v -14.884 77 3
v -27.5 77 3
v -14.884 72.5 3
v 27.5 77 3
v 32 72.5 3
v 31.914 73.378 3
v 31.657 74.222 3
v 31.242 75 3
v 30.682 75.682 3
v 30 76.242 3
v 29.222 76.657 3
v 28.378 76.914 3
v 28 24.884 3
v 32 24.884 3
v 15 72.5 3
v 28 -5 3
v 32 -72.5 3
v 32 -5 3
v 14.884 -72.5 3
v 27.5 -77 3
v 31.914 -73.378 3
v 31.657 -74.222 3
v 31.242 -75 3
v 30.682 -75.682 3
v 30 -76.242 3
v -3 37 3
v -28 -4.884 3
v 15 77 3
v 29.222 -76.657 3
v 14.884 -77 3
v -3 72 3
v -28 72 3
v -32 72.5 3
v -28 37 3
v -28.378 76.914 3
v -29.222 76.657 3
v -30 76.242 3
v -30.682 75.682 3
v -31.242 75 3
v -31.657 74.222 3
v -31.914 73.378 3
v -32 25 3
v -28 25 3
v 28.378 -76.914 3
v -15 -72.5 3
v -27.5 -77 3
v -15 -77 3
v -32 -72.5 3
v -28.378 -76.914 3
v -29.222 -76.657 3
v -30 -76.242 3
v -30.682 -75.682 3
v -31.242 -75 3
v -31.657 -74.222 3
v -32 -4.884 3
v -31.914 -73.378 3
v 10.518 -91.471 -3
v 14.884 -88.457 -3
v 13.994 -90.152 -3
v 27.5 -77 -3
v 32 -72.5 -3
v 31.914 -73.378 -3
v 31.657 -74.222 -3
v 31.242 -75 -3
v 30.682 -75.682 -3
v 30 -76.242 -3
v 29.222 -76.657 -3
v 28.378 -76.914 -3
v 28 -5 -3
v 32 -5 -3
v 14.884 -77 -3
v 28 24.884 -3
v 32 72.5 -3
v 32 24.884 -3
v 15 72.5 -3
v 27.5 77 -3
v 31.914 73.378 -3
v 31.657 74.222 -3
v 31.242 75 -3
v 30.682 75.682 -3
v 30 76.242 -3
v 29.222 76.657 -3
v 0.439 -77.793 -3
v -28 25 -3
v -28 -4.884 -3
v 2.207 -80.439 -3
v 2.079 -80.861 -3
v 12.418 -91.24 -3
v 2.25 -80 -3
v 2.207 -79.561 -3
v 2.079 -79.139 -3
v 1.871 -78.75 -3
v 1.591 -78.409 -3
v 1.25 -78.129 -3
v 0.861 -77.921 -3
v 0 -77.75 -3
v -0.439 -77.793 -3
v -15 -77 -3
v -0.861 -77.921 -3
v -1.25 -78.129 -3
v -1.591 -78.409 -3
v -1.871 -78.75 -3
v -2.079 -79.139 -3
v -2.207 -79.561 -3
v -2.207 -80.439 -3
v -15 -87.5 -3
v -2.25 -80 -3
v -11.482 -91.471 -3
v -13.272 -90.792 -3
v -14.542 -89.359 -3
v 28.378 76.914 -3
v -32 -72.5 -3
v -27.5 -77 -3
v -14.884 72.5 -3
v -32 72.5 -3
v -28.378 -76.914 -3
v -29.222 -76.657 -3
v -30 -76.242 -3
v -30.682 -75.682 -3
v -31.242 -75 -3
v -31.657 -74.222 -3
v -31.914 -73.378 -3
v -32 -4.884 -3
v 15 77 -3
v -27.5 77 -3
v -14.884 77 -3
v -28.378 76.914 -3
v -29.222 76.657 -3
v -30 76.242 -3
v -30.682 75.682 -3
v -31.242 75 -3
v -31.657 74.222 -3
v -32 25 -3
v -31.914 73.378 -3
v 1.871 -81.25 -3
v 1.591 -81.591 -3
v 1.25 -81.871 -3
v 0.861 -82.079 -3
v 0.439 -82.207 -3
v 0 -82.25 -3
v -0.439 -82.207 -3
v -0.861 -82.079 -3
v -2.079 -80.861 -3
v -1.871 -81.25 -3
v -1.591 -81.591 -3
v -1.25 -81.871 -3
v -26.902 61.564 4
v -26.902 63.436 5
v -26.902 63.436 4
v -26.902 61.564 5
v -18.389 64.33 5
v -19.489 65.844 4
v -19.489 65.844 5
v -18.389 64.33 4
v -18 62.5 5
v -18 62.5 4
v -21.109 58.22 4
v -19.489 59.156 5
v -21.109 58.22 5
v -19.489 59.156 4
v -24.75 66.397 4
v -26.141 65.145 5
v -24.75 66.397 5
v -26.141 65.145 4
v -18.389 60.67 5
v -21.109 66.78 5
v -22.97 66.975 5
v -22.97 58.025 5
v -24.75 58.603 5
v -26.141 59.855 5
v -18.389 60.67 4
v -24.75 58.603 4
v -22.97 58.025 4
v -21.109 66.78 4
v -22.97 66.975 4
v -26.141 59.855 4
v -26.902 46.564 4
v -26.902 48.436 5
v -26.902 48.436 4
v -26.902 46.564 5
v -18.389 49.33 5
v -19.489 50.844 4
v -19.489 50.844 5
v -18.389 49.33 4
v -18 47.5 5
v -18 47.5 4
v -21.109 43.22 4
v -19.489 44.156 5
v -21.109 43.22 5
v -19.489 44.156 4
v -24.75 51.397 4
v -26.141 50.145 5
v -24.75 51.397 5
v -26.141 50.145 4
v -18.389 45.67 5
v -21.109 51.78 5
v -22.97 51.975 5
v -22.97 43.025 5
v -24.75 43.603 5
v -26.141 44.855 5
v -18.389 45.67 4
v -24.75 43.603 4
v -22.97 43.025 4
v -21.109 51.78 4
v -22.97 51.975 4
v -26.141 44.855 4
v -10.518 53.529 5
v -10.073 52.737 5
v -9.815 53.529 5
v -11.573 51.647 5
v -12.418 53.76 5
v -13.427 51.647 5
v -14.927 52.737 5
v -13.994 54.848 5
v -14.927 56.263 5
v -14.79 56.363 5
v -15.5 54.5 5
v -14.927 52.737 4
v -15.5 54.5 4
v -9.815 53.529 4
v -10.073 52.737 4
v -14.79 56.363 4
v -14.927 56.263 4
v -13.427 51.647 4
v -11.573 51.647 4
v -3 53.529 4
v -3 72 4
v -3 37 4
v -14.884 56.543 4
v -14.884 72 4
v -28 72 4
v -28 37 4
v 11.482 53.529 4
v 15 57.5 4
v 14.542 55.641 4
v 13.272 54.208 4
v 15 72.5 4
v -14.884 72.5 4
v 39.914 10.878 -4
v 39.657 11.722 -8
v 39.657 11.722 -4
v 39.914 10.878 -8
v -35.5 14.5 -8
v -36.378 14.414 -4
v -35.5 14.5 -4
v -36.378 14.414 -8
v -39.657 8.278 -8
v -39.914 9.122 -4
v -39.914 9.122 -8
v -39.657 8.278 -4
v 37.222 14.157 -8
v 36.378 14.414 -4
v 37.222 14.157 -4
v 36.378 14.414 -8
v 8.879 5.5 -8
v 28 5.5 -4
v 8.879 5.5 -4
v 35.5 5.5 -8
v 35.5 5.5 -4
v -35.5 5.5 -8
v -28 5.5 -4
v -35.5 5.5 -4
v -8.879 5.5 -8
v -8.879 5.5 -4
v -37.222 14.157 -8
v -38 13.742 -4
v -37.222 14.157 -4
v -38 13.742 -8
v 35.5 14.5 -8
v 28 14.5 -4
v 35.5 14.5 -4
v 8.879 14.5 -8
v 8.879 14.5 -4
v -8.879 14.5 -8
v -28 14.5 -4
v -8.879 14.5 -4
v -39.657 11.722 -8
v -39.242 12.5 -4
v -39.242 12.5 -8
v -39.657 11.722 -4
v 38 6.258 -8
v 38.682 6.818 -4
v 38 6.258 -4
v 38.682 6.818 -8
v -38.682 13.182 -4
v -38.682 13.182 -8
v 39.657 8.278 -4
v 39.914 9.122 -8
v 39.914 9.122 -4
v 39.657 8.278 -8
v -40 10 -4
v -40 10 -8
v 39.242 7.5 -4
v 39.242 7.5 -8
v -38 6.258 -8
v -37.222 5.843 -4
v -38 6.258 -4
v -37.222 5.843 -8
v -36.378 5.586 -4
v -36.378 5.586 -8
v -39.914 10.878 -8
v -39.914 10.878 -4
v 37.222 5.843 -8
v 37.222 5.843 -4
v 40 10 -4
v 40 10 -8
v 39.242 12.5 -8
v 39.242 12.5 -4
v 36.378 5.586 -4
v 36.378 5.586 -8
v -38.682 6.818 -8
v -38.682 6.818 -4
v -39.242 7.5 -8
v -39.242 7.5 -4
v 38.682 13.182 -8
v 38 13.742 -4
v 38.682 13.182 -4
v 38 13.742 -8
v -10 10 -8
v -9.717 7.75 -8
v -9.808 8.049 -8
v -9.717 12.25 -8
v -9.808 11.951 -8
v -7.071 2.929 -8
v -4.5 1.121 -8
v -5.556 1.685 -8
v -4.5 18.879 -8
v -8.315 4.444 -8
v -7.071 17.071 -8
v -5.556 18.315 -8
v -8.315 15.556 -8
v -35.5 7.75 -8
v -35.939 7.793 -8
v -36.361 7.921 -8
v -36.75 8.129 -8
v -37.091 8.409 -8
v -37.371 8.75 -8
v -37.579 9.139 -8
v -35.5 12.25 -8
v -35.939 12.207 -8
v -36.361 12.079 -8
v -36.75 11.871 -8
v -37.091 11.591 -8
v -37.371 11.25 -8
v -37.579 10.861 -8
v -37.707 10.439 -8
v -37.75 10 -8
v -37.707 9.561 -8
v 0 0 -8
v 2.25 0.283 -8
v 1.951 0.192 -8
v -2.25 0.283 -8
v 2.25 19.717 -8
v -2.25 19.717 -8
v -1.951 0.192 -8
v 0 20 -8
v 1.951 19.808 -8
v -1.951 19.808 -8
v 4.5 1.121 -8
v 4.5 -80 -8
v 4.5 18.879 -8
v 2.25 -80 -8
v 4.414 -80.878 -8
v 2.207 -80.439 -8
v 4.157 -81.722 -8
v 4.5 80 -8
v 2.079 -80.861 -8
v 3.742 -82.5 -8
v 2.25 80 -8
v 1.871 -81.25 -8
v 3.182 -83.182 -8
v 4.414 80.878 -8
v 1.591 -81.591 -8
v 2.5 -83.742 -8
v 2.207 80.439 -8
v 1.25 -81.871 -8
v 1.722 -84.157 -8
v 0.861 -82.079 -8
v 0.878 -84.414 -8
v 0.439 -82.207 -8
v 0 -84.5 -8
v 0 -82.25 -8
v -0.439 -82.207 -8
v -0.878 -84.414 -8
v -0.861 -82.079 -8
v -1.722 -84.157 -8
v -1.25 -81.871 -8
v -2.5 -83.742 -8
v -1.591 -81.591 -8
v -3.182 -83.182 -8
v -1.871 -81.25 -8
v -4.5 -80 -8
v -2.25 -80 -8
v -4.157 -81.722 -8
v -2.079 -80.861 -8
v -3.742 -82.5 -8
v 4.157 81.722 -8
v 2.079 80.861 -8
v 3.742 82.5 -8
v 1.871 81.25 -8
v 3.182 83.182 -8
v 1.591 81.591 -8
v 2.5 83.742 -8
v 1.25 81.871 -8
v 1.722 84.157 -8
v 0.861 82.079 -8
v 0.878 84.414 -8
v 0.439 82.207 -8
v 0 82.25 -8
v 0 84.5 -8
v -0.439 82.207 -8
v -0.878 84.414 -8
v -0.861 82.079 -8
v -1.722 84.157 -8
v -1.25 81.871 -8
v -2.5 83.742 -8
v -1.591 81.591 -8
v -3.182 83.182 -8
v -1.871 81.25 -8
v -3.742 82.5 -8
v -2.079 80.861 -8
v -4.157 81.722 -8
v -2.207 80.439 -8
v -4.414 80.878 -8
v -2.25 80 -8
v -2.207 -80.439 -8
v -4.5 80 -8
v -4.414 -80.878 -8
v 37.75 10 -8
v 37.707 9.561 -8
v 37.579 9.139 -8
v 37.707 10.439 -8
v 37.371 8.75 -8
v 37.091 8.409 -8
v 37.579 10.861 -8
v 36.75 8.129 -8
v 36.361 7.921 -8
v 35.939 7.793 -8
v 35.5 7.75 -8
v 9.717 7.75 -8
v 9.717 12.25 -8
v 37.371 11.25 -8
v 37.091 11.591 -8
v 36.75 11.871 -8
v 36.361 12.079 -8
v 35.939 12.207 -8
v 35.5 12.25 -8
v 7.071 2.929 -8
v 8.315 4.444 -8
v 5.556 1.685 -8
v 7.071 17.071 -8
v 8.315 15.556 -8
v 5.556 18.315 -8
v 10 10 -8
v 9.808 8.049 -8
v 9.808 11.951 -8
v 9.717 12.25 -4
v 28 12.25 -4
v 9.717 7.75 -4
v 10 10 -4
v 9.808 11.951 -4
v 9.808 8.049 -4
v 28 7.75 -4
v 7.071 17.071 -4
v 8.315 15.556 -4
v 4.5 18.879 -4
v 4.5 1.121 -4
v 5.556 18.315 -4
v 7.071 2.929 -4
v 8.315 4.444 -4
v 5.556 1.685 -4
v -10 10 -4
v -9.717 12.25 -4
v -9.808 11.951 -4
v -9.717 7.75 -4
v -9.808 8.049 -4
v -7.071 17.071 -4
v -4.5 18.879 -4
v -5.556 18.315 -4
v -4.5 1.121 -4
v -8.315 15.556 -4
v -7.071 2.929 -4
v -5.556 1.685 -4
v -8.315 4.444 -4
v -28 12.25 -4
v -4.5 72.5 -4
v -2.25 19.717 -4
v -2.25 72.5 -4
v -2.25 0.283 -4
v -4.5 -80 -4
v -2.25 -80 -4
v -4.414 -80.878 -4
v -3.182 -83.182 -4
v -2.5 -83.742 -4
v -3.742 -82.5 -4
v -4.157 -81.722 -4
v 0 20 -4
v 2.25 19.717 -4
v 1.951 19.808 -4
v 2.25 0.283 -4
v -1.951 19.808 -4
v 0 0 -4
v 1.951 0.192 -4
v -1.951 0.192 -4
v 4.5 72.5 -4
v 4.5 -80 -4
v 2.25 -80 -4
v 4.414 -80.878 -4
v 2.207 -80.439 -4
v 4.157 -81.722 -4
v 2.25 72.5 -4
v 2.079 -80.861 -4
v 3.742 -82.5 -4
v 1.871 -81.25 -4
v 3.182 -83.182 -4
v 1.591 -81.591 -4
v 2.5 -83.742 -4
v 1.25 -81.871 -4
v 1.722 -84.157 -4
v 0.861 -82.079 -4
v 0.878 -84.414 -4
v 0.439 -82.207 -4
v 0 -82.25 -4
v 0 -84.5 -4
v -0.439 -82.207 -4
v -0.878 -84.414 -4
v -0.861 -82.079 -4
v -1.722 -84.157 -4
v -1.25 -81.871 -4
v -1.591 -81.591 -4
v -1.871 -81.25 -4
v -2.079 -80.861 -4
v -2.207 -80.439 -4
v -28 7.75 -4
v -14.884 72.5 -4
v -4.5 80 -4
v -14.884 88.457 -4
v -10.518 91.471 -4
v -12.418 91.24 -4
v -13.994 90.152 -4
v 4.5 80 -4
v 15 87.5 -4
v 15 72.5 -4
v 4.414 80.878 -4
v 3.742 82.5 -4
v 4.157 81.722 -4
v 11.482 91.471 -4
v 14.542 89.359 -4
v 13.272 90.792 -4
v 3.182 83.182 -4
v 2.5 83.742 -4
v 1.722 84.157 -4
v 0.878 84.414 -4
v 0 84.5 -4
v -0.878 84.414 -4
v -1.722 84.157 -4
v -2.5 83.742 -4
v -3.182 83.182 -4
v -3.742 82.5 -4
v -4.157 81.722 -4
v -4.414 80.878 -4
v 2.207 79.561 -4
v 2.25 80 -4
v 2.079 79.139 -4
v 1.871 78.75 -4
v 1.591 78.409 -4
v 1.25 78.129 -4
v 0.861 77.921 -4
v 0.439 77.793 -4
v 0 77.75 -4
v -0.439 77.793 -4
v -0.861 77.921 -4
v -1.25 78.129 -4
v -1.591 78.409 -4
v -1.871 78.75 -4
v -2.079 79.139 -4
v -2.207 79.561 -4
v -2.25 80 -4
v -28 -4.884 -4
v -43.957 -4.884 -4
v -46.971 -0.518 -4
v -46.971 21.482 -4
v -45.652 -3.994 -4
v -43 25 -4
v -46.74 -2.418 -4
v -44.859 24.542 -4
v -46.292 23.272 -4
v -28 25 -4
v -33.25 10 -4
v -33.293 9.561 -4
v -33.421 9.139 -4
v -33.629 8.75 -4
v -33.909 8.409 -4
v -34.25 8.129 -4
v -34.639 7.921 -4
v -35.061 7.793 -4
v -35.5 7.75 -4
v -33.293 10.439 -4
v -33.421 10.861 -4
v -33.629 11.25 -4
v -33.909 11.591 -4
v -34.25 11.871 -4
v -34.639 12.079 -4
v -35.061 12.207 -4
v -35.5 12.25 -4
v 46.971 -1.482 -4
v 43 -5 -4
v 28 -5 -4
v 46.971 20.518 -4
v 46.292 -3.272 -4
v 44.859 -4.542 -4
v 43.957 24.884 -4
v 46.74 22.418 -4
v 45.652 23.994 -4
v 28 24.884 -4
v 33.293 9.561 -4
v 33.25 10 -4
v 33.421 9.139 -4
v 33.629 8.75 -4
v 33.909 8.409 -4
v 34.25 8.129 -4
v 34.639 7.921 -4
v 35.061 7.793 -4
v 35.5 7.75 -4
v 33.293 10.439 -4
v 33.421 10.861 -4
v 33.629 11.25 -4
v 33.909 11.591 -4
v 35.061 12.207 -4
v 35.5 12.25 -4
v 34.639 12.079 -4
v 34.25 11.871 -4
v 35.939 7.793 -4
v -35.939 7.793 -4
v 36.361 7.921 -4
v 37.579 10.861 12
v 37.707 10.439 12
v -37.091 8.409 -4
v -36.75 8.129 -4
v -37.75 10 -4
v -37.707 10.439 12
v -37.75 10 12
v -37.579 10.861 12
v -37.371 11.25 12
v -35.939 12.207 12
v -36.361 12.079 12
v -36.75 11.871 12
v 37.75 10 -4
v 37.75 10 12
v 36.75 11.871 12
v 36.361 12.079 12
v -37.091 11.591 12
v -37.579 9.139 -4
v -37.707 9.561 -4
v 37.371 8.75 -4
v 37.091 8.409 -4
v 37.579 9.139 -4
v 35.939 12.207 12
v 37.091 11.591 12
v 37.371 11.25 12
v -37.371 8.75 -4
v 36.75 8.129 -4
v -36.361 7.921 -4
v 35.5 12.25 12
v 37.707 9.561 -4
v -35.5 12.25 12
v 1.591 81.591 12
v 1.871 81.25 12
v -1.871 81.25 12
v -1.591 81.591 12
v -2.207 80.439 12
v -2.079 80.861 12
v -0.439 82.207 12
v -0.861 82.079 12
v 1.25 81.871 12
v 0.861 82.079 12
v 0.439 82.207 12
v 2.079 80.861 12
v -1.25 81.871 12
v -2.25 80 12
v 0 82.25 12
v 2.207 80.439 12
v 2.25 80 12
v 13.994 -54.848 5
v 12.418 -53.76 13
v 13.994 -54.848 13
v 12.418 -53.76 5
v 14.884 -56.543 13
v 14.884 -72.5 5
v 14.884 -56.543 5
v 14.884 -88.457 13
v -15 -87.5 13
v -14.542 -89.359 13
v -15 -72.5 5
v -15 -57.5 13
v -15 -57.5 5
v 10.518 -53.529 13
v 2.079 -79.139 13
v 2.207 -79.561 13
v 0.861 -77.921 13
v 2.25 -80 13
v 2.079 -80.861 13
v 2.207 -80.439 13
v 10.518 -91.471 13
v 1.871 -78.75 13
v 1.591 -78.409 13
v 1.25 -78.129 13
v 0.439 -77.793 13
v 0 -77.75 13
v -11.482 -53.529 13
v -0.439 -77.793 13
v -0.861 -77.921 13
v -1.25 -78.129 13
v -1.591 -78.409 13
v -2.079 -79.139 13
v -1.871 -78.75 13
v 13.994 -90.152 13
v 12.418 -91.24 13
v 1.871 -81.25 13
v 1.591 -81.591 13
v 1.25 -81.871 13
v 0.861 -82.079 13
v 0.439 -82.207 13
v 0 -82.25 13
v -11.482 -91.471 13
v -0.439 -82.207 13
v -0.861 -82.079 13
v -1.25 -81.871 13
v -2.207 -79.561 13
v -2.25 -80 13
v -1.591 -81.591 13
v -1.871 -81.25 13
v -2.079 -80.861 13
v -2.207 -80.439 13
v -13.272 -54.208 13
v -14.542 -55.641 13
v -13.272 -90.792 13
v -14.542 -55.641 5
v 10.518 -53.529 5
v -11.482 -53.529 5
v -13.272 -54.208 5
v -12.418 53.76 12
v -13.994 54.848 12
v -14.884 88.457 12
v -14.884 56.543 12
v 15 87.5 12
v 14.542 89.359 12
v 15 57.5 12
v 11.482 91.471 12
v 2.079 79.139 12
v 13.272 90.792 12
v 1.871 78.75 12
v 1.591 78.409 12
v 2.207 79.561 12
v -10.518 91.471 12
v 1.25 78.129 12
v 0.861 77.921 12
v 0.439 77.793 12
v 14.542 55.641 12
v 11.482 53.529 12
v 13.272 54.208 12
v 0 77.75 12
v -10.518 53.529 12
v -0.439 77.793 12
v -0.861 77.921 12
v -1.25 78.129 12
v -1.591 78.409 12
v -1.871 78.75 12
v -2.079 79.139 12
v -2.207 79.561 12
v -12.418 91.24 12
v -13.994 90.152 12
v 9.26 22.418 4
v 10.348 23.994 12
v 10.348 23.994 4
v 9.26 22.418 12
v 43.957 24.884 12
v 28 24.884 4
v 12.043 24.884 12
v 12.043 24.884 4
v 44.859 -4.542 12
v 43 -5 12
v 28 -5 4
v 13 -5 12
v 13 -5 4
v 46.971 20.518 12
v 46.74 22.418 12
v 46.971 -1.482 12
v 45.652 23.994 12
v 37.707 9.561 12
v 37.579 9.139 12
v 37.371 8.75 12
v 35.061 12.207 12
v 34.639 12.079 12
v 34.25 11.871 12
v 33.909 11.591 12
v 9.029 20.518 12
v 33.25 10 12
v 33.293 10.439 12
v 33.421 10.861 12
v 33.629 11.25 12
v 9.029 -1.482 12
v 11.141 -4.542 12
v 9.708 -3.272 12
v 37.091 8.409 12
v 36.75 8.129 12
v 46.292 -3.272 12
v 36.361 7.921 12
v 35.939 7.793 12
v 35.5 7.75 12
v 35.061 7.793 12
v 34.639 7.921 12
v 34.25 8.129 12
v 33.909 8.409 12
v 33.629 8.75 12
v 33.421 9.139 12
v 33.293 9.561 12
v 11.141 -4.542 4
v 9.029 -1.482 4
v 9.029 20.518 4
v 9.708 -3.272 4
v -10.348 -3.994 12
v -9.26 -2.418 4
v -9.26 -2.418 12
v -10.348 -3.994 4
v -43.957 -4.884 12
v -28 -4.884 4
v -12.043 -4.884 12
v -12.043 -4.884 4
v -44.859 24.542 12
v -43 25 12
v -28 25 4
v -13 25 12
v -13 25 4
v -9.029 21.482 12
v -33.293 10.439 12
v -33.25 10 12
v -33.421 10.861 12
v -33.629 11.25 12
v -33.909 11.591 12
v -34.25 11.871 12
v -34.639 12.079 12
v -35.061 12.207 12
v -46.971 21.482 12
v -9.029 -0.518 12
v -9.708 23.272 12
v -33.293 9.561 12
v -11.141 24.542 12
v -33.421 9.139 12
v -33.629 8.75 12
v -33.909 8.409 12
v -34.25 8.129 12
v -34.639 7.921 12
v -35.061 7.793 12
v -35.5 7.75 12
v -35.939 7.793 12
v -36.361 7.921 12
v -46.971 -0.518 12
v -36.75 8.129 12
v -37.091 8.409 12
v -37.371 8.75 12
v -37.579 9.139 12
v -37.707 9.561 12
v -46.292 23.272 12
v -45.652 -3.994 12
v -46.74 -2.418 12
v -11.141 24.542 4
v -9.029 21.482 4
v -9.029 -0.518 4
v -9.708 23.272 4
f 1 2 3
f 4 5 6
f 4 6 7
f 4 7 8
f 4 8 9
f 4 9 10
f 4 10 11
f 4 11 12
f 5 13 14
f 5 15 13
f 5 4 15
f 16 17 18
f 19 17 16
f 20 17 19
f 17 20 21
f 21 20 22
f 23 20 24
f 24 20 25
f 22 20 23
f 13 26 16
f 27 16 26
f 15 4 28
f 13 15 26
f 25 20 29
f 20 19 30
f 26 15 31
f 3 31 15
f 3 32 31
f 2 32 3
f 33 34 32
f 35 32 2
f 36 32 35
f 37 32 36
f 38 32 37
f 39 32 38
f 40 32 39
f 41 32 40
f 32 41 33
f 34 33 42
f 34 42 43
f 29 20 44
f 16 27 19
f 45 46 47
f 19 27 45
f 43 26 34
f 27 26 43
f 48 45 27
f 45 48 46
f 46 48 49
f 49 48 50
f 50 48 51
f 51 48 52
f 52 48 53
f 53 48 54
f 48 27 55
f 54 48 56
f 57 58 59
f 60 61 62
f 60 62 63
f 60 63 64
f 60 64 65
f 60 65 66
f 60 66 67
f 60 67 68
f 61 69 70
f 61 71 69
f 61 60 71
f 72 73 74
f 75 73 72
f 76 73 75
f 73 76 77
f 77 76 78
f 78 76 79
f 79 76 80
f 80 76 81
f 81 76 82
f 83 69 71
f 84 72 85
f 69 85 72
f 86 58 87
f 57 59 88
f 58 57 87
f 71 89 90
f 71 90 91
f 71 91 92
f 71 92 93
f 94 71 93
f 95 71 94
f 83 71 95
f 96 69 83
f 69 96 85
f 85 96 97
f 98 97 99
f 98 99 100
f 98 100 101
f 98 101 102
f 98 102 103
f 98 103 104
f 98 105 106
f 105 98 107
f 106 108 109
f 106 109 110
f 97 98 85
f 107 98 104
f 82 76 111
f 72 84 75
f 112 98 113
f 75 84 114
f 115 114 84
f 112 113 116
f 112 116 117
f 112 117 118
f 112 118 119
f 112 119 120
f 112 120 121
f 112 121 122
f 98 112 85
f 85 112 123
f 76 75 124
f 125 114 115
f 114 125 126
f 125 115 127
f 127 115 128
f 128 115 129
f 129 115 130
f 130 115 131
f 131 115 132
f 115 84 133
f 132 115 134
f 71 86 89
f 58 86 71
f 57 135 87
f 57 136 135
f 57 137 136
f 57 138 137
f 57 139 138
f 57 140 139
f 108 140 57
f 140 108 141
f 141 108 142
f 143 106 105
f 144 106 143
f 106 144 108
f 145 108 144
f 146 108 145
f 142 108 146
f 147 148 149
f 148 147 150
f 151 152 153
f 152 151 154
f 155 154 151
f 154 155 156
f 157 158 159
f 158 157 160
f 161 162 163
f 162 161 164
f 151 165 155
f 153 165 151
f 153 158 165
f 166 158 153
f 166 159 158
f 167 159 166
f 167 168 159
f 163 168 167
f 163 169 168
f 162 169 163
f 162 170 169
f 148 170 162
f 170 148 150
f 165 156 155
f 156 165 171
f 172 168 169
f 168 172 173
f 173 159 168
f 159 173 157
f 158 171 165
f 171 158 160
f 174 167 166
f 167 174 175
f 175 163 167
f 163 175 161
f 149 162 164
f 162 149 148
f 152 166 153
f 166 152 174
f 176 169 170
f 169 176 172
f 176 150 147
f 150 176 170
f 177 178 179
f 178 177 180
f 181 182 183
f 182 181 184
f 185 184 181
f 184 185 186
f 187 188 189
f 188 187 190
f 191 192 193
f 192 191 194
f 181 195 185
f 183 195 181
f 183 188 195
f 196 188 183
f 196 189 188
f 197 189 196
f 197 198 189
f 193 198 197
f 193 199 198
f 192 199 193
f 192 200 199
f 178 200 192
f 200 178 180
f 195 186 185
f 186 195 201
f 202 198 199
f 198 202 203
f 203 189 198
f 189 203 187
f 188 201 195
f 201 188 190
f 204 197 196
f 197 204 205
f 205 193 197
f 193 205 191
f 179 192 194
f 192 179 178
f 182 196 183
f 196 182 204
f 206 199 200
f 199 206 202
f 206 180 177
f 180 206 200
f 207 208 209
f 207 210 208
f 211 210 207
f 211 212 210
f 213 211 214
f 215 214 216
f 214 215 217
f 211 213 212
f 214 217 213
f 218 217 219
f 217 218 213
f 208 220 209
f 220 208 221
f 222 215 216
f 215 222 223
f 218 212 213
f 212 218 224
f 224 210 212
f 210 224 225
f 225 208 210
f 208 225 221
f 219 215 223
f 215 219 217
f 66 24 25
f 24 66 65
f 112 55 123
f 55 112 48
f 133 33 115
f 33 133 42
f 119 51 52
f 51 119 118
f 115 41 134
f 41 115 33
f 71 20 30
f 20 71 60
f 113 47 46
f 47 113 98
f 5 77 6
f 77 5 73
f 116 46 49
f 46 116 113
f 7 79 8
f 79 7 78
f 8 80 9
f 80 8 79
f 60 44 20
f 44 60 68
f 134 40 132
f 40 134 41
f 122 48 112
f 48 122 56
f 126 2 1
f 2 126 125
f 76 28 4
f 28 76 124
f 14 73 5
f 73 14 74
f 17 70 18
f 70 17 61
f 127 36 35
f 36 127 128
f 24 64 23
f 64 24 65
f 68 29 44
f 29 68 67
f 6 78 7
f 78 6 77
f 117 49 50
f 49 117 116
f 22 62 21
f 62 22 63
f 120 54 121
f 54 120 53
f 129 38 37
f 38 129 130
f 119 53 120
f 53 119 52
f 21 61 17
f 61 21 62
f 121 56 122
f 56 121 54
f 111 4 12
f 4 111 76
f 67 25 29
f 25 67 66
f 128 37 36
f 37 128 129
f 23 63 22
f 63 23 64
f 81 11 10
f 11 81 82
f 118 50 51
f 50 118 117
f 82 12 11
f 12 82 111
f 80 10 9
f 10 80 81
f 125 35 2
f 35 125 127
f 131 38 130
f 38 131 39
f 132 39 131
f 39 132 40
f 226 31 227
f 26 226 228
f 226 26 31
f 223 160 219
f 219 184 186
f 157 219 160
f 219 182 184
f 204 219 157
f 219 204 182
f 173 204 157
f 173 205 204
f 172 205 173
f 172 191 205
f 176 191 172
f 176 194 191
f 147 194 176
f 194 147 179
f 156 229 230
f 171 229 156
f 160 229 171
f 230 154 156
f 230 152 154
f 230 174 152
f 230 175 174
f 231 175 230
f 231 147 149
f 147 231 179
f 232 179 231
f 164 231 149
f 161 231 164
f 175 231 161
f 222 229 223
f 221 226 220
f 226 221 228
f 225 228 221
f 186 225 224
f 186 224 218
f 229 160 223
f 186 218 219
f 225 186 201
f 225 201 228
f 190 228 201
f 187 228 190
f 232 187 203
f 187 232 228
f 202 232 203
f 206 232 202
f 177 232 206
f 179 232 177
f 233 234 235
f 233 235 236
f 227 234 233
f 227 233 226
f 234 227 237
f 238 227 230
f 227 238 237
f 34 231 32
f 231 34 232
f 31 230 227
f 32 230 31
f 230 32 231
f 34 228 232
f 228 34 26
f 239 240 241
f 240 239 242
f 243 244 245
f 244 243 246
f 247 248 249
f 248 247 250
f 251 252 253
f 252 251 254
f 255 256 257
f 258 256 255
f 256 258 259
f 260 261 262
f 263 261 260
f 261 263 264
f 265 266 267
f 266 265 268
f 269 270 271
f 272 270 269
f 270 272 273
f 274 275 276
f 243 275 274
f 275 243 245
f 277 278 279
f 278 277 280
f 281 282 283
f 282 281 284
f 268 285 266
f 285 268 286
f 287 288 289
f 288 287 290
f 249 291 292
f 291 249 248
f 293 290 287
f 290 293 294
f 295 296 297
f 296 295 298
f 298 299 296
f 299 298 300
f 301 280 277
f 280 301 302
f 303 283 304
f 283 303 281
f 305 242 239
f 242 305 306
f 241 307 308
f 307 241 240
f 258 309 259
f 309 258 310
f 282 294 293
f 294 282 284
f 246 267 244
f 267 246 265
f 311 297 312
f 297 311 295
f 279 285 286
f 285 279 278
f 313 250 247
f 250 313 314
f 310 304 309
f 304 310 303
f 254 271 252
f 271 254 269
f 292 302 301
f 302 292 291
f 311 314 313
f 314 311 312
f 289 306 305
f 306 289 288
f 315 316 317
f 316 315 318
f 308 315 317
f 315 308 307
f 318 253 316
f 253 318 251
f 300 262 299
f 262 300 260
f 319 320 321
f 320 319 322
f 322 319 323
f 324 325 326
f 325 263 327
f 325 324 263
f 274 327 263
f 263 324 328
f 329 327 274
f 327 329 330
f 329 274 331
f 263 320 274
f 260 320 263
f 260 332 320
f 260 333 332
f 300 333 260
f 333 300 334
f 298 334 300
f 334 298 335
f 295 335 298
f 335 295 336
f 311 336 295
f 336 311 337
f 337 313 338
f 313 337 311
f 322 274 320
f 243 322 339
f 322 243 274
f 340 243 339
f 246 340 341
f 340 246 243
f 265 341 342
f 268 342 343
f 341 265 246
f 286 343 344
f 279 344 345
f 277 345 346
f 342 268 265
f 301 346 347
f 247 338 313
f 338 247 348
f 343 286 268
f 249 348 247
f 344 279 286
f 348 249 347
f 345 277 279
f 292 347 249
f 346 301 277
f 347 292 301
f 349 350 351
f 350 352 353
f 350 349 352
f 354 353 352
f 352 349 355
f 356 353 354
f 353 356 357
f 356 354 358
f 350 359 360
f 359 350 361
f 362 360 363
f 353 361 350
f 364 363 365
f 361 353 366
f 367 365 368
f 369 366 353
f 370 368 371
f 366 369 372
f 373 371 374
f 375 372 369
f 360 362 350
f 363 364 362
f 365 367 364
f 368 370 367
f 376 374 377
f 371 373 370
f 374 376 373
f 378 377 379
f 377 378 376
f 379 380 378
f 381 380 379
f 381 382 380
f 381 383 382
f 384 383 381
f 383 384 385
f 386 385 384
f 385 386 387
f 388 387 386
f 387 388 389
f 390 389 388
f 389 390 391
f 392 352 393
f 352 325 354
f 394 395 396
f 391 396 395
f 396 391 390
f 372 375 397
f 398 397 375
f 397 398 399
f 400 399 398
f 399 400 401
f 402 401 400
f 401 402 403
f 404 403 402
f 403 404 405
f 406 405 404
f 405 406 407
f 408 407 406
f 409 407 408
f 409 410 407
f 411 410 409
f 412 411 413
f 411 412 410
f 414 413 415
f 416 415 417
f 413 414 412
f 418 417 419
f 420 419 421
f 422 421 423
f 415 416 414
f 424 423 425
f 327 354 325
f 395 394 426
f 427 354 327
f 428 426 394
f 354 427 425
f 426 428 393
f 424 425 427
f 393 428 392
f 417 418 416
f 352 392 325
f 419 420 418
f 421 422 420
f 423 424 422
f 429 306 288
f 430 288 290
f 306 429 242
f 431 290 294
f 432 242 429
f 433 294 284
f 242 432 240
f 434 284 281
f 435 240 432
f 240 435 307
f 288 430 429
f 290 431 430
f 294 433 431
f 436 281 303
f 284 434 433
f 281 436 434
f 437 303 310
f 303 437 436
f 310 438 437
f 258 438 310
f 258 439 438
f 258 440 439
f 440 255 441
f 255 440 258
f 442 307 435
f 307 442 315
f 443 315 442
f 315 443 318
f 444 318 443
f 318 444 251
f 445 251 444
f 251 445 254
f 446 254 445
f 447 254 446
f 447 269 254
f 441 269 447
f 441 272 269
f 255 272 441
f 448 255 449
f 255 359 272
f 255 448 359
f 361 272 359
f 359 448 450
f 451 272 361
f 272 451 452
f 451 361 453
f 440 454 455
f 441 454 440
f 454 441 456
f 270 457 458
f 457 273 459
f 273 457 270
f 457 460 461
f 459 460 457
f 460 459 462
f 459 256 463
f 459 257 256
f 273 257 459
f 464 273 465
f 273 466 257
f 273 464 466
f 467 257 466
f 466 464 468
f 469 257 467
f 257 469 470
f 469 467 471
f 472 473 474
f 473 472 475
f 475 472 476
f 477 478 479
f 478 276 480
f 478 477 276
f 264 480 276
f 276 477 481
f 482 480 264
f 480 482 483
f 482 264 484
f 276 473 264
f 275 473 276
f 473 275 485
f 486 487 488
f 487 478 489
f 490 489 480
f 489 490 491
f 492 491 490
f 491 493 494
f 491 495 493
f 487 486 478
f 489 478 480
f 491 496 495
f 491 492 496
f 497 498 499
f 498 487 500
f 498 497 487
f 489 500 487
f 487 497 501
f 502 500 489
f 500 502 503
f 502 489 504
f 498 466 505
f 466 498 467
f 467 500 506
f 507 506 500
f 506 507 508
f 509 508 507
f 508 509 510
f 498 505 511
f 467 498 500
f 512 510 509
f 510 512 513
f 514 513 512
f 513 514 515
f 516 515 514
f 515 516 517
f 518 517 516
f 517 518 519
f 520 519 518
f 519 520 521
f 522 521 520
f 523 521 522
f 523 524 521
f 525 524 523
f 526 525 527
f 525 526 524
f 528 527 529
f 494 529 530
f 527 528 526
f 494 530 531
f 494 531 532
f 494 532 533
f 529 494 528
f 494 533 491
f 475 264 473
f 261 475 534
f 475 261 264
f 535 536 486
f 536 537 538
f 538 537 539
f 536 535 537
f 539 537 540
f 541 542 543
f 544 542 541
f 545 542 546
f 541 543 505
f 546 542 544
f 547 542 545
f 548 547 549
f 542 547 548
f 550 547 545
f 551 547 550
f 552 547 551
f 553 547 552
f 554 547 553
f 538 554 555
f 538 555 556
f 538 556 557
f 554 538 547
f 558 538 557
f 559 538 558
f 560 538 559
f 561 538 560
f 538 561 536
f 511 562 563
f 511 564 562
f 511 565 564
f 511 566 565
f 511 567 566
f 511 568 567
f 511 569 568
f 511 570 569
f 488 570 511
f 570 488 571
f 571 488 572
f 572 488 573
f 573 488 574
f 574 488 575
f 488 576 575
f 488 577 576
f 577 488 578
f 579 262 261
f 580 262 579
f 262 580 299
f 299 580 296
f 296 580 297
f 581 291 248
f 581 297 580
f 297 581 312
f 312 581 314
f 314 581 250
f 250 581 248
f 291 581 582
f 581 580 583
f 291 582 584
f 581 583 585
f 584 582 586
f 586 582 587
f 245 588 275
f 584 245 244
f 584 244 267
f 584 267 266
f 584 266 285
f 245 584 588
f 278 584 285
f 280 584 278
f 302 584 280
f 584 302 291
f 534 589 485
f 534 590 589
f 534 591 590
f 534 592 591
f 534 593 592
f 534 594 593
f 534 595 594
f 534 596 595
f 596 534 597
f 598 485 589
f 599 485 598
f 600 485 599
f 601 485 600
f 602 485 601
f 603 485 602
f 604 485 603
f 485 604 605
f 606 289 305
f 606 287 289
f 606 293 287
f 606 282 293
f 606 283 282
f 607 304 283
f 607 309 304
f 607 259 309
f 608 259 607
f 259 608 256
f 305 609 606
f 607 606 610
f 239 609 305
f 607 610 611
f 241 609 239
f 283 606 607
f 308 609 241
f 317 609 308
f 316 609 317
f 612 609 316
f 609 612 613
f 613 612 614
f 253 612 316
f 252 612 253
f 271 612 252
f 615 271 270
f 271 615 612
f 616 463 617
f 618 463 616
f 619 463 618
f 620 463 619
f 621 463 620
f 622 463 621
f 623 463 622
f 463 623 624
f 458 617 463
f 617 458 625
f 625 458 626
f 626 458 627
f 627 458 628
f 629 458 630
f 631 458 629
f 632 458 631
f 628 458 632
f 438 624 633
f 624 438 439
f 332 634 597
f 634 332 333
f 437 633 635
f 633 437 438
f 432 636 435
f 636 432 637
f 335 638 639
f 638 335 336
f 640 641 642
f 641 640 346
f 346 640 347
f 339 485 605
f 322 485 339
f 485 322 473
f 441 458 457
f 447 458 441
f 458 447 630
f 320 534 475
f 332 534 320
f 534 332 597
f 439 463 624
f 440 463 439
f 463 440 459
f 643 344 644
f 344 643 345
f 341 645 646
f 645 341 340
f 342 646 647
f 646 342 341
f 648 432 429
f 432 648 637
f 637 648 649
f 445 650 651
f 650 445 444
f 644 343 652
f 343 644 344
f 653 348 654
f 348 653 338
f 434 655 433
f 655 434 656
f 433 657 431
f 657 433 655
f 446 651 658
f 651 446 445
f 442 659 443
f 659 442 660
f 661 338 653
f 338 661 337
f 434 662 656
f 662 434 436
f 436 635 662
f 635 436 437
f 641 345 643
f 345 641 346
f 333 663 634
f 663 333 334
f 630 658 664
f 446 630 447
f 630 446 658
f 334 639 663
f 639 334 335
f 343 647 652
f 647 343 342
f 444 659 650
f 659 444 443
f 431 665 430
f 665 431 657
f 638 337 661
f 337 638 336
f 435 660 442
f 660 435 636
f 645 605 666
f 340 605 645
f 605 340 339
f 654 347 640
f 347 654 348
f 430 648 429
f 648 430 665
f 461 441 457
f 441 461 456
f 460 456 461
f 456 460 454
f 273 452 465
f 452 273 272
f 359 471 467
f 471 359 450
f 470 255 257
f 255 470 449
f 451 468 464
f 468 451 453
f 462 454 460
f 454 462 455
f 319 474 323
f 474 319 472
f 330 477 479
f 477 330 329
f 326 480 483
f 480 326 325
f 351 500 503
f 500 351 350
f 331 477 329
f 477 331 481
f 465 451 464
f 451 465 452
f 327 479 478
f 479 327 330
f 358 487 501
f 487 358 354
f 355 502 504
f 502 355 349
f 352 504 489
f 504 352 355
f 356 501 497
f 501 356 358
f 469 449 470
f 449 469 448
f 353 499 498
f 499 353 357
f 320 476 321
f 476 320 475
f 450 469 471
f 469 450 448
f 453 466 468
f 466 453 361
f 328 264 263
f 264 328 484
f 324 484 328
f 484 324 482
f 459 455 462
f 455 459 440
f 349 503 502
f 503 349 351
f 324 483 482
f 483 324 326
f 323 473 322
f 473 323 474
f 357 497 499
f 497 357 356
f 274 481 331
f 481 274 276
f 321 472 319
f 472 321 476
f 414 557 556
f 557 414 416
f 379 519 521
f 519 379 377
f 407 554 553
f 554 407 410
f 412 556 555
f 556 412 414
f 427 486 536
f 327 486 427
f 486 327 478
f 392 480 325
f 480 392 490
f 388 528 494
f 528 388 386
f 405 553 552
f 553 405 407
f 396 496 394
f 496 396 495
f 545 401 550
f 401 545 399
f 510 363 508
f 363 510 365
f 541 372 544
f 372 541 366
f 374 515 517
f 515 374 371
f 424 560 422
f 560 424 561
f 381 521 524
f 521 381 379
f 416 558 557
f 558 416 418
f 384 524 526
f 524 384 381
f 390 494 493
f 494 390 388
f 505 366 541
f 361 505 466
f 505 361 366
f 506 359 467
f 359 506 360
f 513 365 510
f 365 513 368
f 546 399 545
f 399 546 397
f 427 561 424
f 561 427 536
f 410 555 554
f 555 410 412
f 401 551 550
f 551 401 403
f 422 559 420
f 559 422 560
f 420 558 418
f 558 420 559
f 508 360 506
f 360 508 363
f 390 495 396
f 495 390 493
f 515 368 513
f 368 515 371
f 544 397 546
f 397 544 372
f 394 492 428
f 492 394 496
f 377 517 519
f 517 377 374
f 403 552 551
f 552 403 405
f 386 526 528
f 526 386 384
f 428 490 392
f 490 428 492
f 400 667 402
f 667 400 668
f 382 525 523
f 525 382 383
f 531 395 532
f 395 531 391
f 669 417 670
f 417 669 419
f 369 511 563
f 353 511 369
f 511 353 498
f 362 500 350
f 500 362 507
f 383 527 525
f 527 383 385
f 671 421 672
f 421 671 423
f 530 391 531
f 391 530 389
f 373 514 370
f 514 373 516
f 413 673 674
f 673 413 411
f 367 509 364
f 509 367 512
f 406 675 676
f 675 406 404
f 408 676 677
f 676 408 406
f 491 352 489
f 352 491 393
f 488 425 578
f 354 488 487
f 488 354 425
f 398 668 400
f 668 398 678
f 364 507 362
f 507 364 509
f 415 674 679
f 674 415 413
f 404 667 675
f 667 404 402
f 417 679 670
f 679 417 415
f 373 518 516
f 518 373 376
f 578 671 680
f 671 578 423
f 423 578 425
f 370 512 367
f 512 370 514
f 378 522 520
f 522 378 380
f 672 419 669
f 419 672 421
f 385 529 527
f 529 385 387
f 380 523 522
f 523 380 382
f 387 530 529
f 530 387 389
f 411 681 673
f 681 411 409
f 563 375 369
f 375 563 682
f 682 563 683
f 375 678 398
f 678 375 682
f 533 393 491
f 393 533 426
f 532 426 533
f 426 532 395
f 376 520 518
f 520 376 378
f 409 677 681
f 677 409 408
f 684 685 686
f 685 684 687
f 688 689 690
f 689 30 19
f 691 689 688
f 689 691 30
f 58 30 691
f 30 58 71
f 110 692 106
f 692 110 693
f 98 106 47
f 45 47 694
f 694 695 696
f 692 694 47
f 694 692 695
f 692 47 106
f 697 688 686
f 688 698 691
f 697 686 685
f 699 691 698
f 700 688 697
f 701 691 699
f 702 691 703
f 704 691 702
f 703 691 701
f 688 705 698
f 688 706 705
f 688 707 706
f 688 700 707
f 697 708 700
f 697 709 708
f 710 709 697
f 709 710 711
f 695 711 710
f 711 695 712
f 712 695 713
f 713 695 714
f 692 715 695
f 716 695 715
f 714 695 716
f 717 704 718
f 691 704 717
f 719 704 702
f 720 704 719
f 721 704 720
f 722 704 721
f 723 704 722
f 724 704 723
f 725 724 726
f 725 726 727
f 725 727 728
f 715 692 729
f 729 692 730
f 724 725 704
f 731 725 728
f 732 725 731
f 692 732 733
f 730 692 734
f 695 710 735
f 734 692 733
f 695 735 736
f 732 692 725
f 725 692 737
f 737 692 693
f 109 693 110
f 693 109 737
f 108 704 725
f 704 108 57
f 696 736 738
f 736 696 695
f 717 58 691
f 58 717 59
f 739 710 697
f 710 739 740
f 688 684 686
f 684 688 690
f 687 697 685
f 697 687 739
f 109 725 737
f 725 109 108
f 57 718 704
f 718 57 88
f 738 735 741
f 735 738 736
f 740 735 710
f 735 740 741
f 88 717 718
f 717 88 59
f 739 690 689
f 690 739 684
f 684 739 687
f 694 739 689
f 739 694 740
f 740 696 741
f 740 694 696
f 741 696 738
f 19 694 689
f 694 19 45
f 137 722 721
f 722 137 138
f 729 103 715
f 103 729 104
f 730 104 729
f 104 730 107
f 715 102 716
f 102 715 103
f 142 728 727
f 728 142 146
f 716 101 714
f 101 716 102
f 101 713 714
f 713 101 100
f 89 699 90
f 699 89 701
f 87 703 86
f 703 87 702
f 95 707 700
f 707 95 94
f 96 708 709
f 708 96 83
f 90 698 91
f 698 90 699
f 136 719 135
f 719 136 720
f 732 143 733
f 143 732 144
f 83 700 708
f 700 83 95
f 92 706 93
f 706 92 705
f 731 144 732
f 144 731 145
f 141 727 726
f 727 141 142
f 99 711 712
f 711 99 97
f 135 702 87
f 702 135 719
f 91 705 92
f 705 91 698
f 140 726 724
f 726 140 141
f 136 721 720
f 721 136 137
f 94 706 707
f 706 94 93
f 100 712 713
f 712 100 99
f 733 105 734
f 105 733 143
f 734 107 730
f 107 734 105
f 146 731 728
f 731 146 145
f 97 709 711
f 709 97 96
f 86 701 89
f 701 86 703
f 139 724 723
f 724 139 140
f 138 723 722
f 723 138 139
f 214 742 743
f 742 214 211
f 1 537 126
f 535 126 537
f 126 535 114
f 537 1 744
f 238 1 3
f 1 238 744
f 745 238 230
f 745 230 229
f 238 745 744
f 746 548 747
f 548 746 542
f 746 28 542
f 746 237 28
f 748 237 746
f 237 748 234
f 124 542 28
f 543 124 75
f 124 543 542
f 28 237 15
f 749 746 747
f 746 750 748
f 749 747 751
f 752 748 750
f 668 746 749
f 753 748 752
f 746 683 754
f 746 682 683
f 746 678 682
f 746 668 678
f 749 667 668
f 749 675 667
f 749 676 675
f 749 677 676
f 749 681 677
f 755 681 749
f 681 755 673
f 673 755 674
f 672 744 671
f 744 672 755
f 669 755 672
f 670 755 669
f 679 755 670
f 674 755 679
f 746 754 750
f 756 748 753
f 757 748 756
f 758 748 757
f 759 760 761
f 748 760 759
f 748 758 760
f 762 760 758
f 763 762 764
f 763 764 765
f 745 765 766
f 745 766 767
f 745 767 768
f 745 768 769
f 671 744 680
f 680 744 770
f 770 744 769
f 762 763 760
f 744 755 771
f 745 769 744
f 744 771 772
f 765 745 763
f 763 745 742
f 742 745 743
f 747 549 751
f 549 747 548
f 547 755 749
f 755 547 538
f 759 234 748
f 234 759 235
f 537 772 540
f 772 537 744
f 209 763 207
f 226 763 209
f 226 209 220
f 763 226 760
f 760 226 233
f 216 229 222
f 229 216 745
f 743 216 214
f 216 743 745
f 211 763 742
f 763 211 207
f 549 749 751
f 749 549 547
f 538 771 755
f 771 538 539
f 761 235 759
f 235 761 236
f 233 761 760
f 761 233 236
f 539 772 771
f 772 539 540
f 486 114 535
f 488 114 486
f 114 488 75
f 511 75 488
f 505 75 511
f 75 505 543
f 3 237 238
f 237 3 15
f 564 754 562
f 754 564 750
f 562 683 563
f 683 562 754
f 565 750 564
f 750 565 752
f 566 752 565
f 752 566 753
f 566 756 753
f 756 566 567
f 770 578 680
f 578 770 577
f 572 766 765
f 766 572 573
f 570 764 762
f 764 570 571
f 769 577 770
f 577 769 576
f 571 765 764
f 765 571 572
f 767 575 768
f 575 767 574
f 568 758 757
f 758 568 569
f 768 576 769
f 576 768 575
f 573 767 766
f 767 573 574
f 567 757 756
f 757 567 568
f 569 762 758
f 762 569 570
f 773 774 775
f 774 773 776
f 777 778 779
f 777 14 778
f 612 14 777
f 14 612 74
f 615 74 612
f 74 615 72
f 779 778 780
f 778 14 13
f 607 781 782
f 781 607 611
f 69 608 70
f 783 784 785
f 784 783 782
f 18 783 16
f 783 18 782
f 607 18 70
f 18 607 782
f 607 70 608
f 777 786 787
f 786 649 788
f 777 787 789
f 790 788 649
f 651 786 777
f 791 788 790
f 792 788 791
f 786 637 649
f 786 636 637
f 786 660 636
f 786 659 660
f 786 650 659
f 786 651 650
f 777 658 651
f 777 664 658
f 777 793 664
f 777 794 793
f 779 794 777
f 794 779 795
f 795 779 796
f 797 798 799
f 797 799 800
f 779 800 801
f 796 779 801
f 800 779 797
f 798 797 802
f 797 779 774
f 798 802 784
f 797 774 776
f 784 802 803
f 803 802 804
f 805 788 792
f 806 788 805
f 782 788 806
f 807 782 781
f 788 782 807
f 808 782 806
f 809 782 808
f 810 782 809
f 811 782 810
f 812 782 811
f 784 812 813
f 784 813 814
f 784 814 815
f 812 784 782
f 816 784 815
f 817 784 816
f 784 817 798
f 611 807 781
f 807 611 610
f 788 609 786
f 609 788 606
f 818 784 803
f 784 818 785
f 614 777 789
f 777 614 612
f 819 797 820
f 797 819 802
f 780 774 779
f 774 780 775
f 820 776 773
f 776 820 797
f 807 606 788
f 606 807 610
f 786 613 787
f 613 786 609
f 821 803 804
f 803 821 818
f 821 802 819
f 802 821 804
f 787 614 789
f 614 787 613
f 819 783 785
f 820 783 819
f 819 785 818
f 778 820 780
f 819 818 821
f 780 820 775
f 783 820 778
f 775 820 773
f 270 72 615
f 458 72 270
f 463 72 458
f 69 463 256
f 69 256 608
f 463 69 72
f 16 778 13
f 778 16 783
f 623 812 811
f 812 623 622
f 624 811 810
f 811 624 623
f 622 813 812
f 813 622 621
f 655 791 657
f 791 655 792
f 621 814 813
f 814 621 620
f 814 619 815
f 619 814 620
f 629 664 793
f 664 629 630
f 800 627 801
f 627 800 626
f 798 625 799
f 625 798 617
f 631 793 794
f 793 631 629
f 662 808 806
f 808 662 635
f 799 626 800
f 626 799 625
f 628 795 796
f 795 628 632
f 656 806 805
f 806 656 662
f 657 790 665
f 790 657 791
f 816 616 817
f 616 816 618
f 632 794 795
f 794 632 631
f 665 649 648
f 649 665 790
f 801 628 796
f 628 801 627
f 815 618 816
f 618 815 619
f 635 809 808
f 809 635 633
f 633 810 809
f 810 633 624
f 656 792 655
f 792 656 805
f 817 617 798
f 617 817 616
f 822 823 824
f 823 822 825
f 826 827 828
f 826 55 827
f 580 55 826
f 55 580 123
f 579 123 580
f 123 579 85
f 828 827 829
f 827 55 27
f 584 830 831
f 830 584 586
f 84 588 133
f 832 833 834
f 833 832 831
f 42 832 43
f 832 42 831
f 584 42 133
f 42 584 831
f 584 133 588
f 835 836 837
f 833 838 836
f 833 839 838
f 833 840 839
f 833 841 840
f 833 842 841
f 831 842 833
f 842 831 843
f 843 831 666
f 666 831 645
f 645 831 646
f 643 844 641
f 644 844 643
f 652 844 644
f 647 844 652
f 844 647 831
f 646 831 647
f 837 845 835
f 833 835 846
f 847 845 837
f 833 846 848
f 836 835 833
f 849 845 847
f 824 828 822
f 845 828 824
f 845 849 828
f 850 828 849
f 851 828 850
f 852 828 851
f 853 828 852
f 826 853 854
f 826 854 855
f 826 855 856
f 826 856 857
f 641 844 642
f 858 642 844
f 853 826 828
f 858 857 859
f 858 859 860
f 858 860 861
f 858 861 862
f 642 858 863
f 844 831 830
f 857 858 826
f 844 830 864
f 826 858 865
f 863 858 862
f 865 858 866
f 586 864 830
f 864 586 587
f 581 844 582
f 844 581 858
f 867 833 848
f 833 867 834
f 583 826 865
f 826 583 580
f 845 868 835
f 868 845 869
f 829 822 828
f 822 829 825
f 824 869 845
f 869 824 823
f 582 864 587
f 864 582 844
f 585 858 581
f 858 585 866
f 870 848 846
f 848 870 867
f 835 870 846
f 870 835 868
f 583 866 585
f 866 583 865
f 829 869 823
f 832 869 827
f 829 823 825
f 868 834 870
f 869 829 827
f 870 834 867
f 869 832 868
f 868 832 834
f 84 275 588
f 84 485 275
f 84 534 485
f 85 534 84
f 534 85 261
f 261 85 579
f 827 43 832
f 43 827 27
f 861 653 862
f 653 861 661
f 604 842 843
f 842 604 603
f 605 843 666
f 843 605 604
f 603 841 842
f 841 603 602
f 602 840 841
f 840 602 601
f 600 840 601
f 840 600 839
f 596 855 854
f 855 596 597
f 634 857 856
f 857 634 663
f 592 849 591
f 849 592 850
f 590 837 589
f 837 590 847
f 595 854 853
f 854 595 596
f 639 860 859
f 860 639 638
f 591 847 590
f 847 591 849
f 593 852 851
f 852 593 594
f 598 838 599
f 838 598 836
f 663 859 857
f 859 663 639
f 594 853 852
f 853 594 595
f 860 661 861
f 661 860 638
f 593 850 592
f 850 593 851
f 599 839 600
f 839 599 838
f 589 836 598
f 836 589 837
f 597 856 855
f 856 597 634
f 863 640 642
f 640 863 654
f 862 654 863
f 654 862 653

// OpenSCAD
// file: holder.scad
len_phone = 145;
d_screw_m4 = 4.5;
width_phone = 56;
thikness_holder = 4;
thikness_phone = 8;
append = 15;
corner_round = 8;
w_grip = 30;

//holder_set();
//vertical_block(len_phone);
test_print_holder();

module test_print_holder() {
    translate([0,-20, 6])
    grip();
    horizontal_block(len_block=width_phone, offset_vertical=10);
}

module grip() {
    difference() {
        grip_base();
        
        color("red")
        translate([0, w_grip/2, thikness_phone])
        cube([w_grip+1, w_grip, 2*thikness_phone], center=true);
        
        translate([0, -w_grip/4, 0])
        cylinder(d=d_screw_m4, 3*thikness_phone, center=true, $fn=32);
    }
}


module grip_base() {
    hull() {
        translate([w_grip/2-corner_round/2, -w_grip/2, 0])
        cylinder(d=corner_round, 2*thikness_phone, center=true);
        
        translate([-w_grip/2+corner_round/2, -w_grip/2, 0])
        cylinder(d=corner_round, 2*thikness_phone, center=true);
        
        translate([w_grip/2-corner_round/2, w_grip/2, 0])
        cylinder(d=corner_round, 2*thikness_phone, center=true);
        
        translate([-w_grip/2+corner_round/2, w_grip/2, 0])
        cylinder(d=corner_round, 2*thikness_phone, center=true);
    }
}


module horizontal_block(len_block, offset_vertical) {
    len_block = len_block + append;
    
    translate([0, offset_vertical, 0])
    cylinder(d=20, h=thikness_holder, center=true, $fn=32);
    
    difference() {
        hull() {
            translate([len_block/2, offset_vertical, 0])
            cylinder(d=9, h=thikness_holder, center=true, $fn=32);
            
            translate([-len_block/2, offset_vertical, 0])
            cylinder(d=9, h=thikness_holder, center=true, $fn=32);
        }
        color("red")
        hull() {
            translate([len_block/2, offset_vertical, 0])
            cylinder(d=d_screw_m4, h=thikness_holder+2, center=true, $fn=32);
            
            translate([-len_block/2, offset_vertical, 0])
            cylinder(d=d_screw_m4, h=thikness_holder+2, center=true, $fn=32);
        }
    }
}


module vertical_block(len_block) {
    len_block = len_block + append;
    
        difference() {
            hull() {
                //translate([0, -len_phone/2, 0])
                translate([0, -len_block/2, 0])
                cylinder(d=9, h=thikness_holder, center=true, $fn=32);
                
                //translate([0, -len_phone/2, 0])
                translate([0, len_block/2, 0])
                cylinder(d=9, h=thikness_holder, center=true, $fn=32);
            }
            color("red")
            hull() {
                //translate([0, -len_phone/2, 0])
                translate([0, -len_block/2, 0])
                cylinder(d=d_screw_m4, h=thikness_holder+2, center=true, $fn=32);
                
                //translate([0, -len_phone/2, 0])
                translate([0, len_block/2, 0])
                cylinder(d=d_screw_m4, h=thikness_holder+2, center=true, $fn=32);
        }
    }
}

module holder_set() {
    horizontal_block(len_block=width_phone, offset_vertical=10);
    vertical_block(len_block=len_phone);
    
    translate([0, -len_phone/2, thikness_phone+thikness_holder/2+1])
    rotate([0, 180, 0])
    grip();
    
    translate([0, len_phone/2, thikness_phone+thikness_holder/2])
    rotate([0, 180, 180])
    grip();
    
    translate([width_phone/2, 10, thikness_phone+thikness_holder/2])
    rotate([0, 180, 90])
    grip();
    
    translate([-width_phone/2, 10, thikness_phone+thikness_holder/2])
    rotate([0, 180, -90])
    grip();
}
// file: smartphone.scad
echo("Работа Вадима Разеева");
len_phone = 145;
width_phone = 55
;
thickness_phone = 6;

corner_round = 9;

module camera() {
    cube([width_phone, len_phone, thickness_phone], center=true);

    color("blue")
    translate([width_phone/2-50, len_phone/2-10, 0])
    cylinder(d=9, h = thickness_phone - 1);

    color("blue")
    translate([width_phone/2-50, len_phone/2-25, 0])
    cylinder(d=9, h = thickness_phone - 1);

    color("blue")
    translate([width_phone/2-40, len_phone/2-18, 0])
    cylinder(d=6, h = thickness_phone - 1);
}

module smartphone_block() {
    hull() {
        color("red")
        translate([width_phone/2, len_phone/2, 0])
        cylinder(h=thickness_phone, d=corner_round, $fn=32, center=true);

        mirror([1,0,0])
        color("red")
        translate([width_phone/2, len_phone/2, 0])
        cylinder(h=thickness_phone, d=corner_round, $fn=32, center=true);

        mirror([0,1,0])
        color("red")
        translate([width_phone/2, len_phone/2, 0])
        cylinder(h=thickness_phone, d=corner_round, $fn=32, center=true);

        mirror([1,0,0])
        mirror([0,1,0])
        color("red")
        translate([width_phone/2, len_phone/2, 0])
        cylinder(h=thickness_phone, d=corner_round, $fn=32, center=true);
    }
}

h = 3;

module smartphone() {
    smartphone_block();
    camera();
    color("red")
    translate([-28, 37, 2])
    cube([25, 35, 2]);
}

smartphone();
// main file
use <smartphone.scad>
use <holder.scad>

thickness_phone = 8;
thickness_holder = 4;

echo("Работа Вадима Разеева");

smartphone();
translate([0, 0, -thickness_phone/2-thickness_holder/2])
holder_set();
